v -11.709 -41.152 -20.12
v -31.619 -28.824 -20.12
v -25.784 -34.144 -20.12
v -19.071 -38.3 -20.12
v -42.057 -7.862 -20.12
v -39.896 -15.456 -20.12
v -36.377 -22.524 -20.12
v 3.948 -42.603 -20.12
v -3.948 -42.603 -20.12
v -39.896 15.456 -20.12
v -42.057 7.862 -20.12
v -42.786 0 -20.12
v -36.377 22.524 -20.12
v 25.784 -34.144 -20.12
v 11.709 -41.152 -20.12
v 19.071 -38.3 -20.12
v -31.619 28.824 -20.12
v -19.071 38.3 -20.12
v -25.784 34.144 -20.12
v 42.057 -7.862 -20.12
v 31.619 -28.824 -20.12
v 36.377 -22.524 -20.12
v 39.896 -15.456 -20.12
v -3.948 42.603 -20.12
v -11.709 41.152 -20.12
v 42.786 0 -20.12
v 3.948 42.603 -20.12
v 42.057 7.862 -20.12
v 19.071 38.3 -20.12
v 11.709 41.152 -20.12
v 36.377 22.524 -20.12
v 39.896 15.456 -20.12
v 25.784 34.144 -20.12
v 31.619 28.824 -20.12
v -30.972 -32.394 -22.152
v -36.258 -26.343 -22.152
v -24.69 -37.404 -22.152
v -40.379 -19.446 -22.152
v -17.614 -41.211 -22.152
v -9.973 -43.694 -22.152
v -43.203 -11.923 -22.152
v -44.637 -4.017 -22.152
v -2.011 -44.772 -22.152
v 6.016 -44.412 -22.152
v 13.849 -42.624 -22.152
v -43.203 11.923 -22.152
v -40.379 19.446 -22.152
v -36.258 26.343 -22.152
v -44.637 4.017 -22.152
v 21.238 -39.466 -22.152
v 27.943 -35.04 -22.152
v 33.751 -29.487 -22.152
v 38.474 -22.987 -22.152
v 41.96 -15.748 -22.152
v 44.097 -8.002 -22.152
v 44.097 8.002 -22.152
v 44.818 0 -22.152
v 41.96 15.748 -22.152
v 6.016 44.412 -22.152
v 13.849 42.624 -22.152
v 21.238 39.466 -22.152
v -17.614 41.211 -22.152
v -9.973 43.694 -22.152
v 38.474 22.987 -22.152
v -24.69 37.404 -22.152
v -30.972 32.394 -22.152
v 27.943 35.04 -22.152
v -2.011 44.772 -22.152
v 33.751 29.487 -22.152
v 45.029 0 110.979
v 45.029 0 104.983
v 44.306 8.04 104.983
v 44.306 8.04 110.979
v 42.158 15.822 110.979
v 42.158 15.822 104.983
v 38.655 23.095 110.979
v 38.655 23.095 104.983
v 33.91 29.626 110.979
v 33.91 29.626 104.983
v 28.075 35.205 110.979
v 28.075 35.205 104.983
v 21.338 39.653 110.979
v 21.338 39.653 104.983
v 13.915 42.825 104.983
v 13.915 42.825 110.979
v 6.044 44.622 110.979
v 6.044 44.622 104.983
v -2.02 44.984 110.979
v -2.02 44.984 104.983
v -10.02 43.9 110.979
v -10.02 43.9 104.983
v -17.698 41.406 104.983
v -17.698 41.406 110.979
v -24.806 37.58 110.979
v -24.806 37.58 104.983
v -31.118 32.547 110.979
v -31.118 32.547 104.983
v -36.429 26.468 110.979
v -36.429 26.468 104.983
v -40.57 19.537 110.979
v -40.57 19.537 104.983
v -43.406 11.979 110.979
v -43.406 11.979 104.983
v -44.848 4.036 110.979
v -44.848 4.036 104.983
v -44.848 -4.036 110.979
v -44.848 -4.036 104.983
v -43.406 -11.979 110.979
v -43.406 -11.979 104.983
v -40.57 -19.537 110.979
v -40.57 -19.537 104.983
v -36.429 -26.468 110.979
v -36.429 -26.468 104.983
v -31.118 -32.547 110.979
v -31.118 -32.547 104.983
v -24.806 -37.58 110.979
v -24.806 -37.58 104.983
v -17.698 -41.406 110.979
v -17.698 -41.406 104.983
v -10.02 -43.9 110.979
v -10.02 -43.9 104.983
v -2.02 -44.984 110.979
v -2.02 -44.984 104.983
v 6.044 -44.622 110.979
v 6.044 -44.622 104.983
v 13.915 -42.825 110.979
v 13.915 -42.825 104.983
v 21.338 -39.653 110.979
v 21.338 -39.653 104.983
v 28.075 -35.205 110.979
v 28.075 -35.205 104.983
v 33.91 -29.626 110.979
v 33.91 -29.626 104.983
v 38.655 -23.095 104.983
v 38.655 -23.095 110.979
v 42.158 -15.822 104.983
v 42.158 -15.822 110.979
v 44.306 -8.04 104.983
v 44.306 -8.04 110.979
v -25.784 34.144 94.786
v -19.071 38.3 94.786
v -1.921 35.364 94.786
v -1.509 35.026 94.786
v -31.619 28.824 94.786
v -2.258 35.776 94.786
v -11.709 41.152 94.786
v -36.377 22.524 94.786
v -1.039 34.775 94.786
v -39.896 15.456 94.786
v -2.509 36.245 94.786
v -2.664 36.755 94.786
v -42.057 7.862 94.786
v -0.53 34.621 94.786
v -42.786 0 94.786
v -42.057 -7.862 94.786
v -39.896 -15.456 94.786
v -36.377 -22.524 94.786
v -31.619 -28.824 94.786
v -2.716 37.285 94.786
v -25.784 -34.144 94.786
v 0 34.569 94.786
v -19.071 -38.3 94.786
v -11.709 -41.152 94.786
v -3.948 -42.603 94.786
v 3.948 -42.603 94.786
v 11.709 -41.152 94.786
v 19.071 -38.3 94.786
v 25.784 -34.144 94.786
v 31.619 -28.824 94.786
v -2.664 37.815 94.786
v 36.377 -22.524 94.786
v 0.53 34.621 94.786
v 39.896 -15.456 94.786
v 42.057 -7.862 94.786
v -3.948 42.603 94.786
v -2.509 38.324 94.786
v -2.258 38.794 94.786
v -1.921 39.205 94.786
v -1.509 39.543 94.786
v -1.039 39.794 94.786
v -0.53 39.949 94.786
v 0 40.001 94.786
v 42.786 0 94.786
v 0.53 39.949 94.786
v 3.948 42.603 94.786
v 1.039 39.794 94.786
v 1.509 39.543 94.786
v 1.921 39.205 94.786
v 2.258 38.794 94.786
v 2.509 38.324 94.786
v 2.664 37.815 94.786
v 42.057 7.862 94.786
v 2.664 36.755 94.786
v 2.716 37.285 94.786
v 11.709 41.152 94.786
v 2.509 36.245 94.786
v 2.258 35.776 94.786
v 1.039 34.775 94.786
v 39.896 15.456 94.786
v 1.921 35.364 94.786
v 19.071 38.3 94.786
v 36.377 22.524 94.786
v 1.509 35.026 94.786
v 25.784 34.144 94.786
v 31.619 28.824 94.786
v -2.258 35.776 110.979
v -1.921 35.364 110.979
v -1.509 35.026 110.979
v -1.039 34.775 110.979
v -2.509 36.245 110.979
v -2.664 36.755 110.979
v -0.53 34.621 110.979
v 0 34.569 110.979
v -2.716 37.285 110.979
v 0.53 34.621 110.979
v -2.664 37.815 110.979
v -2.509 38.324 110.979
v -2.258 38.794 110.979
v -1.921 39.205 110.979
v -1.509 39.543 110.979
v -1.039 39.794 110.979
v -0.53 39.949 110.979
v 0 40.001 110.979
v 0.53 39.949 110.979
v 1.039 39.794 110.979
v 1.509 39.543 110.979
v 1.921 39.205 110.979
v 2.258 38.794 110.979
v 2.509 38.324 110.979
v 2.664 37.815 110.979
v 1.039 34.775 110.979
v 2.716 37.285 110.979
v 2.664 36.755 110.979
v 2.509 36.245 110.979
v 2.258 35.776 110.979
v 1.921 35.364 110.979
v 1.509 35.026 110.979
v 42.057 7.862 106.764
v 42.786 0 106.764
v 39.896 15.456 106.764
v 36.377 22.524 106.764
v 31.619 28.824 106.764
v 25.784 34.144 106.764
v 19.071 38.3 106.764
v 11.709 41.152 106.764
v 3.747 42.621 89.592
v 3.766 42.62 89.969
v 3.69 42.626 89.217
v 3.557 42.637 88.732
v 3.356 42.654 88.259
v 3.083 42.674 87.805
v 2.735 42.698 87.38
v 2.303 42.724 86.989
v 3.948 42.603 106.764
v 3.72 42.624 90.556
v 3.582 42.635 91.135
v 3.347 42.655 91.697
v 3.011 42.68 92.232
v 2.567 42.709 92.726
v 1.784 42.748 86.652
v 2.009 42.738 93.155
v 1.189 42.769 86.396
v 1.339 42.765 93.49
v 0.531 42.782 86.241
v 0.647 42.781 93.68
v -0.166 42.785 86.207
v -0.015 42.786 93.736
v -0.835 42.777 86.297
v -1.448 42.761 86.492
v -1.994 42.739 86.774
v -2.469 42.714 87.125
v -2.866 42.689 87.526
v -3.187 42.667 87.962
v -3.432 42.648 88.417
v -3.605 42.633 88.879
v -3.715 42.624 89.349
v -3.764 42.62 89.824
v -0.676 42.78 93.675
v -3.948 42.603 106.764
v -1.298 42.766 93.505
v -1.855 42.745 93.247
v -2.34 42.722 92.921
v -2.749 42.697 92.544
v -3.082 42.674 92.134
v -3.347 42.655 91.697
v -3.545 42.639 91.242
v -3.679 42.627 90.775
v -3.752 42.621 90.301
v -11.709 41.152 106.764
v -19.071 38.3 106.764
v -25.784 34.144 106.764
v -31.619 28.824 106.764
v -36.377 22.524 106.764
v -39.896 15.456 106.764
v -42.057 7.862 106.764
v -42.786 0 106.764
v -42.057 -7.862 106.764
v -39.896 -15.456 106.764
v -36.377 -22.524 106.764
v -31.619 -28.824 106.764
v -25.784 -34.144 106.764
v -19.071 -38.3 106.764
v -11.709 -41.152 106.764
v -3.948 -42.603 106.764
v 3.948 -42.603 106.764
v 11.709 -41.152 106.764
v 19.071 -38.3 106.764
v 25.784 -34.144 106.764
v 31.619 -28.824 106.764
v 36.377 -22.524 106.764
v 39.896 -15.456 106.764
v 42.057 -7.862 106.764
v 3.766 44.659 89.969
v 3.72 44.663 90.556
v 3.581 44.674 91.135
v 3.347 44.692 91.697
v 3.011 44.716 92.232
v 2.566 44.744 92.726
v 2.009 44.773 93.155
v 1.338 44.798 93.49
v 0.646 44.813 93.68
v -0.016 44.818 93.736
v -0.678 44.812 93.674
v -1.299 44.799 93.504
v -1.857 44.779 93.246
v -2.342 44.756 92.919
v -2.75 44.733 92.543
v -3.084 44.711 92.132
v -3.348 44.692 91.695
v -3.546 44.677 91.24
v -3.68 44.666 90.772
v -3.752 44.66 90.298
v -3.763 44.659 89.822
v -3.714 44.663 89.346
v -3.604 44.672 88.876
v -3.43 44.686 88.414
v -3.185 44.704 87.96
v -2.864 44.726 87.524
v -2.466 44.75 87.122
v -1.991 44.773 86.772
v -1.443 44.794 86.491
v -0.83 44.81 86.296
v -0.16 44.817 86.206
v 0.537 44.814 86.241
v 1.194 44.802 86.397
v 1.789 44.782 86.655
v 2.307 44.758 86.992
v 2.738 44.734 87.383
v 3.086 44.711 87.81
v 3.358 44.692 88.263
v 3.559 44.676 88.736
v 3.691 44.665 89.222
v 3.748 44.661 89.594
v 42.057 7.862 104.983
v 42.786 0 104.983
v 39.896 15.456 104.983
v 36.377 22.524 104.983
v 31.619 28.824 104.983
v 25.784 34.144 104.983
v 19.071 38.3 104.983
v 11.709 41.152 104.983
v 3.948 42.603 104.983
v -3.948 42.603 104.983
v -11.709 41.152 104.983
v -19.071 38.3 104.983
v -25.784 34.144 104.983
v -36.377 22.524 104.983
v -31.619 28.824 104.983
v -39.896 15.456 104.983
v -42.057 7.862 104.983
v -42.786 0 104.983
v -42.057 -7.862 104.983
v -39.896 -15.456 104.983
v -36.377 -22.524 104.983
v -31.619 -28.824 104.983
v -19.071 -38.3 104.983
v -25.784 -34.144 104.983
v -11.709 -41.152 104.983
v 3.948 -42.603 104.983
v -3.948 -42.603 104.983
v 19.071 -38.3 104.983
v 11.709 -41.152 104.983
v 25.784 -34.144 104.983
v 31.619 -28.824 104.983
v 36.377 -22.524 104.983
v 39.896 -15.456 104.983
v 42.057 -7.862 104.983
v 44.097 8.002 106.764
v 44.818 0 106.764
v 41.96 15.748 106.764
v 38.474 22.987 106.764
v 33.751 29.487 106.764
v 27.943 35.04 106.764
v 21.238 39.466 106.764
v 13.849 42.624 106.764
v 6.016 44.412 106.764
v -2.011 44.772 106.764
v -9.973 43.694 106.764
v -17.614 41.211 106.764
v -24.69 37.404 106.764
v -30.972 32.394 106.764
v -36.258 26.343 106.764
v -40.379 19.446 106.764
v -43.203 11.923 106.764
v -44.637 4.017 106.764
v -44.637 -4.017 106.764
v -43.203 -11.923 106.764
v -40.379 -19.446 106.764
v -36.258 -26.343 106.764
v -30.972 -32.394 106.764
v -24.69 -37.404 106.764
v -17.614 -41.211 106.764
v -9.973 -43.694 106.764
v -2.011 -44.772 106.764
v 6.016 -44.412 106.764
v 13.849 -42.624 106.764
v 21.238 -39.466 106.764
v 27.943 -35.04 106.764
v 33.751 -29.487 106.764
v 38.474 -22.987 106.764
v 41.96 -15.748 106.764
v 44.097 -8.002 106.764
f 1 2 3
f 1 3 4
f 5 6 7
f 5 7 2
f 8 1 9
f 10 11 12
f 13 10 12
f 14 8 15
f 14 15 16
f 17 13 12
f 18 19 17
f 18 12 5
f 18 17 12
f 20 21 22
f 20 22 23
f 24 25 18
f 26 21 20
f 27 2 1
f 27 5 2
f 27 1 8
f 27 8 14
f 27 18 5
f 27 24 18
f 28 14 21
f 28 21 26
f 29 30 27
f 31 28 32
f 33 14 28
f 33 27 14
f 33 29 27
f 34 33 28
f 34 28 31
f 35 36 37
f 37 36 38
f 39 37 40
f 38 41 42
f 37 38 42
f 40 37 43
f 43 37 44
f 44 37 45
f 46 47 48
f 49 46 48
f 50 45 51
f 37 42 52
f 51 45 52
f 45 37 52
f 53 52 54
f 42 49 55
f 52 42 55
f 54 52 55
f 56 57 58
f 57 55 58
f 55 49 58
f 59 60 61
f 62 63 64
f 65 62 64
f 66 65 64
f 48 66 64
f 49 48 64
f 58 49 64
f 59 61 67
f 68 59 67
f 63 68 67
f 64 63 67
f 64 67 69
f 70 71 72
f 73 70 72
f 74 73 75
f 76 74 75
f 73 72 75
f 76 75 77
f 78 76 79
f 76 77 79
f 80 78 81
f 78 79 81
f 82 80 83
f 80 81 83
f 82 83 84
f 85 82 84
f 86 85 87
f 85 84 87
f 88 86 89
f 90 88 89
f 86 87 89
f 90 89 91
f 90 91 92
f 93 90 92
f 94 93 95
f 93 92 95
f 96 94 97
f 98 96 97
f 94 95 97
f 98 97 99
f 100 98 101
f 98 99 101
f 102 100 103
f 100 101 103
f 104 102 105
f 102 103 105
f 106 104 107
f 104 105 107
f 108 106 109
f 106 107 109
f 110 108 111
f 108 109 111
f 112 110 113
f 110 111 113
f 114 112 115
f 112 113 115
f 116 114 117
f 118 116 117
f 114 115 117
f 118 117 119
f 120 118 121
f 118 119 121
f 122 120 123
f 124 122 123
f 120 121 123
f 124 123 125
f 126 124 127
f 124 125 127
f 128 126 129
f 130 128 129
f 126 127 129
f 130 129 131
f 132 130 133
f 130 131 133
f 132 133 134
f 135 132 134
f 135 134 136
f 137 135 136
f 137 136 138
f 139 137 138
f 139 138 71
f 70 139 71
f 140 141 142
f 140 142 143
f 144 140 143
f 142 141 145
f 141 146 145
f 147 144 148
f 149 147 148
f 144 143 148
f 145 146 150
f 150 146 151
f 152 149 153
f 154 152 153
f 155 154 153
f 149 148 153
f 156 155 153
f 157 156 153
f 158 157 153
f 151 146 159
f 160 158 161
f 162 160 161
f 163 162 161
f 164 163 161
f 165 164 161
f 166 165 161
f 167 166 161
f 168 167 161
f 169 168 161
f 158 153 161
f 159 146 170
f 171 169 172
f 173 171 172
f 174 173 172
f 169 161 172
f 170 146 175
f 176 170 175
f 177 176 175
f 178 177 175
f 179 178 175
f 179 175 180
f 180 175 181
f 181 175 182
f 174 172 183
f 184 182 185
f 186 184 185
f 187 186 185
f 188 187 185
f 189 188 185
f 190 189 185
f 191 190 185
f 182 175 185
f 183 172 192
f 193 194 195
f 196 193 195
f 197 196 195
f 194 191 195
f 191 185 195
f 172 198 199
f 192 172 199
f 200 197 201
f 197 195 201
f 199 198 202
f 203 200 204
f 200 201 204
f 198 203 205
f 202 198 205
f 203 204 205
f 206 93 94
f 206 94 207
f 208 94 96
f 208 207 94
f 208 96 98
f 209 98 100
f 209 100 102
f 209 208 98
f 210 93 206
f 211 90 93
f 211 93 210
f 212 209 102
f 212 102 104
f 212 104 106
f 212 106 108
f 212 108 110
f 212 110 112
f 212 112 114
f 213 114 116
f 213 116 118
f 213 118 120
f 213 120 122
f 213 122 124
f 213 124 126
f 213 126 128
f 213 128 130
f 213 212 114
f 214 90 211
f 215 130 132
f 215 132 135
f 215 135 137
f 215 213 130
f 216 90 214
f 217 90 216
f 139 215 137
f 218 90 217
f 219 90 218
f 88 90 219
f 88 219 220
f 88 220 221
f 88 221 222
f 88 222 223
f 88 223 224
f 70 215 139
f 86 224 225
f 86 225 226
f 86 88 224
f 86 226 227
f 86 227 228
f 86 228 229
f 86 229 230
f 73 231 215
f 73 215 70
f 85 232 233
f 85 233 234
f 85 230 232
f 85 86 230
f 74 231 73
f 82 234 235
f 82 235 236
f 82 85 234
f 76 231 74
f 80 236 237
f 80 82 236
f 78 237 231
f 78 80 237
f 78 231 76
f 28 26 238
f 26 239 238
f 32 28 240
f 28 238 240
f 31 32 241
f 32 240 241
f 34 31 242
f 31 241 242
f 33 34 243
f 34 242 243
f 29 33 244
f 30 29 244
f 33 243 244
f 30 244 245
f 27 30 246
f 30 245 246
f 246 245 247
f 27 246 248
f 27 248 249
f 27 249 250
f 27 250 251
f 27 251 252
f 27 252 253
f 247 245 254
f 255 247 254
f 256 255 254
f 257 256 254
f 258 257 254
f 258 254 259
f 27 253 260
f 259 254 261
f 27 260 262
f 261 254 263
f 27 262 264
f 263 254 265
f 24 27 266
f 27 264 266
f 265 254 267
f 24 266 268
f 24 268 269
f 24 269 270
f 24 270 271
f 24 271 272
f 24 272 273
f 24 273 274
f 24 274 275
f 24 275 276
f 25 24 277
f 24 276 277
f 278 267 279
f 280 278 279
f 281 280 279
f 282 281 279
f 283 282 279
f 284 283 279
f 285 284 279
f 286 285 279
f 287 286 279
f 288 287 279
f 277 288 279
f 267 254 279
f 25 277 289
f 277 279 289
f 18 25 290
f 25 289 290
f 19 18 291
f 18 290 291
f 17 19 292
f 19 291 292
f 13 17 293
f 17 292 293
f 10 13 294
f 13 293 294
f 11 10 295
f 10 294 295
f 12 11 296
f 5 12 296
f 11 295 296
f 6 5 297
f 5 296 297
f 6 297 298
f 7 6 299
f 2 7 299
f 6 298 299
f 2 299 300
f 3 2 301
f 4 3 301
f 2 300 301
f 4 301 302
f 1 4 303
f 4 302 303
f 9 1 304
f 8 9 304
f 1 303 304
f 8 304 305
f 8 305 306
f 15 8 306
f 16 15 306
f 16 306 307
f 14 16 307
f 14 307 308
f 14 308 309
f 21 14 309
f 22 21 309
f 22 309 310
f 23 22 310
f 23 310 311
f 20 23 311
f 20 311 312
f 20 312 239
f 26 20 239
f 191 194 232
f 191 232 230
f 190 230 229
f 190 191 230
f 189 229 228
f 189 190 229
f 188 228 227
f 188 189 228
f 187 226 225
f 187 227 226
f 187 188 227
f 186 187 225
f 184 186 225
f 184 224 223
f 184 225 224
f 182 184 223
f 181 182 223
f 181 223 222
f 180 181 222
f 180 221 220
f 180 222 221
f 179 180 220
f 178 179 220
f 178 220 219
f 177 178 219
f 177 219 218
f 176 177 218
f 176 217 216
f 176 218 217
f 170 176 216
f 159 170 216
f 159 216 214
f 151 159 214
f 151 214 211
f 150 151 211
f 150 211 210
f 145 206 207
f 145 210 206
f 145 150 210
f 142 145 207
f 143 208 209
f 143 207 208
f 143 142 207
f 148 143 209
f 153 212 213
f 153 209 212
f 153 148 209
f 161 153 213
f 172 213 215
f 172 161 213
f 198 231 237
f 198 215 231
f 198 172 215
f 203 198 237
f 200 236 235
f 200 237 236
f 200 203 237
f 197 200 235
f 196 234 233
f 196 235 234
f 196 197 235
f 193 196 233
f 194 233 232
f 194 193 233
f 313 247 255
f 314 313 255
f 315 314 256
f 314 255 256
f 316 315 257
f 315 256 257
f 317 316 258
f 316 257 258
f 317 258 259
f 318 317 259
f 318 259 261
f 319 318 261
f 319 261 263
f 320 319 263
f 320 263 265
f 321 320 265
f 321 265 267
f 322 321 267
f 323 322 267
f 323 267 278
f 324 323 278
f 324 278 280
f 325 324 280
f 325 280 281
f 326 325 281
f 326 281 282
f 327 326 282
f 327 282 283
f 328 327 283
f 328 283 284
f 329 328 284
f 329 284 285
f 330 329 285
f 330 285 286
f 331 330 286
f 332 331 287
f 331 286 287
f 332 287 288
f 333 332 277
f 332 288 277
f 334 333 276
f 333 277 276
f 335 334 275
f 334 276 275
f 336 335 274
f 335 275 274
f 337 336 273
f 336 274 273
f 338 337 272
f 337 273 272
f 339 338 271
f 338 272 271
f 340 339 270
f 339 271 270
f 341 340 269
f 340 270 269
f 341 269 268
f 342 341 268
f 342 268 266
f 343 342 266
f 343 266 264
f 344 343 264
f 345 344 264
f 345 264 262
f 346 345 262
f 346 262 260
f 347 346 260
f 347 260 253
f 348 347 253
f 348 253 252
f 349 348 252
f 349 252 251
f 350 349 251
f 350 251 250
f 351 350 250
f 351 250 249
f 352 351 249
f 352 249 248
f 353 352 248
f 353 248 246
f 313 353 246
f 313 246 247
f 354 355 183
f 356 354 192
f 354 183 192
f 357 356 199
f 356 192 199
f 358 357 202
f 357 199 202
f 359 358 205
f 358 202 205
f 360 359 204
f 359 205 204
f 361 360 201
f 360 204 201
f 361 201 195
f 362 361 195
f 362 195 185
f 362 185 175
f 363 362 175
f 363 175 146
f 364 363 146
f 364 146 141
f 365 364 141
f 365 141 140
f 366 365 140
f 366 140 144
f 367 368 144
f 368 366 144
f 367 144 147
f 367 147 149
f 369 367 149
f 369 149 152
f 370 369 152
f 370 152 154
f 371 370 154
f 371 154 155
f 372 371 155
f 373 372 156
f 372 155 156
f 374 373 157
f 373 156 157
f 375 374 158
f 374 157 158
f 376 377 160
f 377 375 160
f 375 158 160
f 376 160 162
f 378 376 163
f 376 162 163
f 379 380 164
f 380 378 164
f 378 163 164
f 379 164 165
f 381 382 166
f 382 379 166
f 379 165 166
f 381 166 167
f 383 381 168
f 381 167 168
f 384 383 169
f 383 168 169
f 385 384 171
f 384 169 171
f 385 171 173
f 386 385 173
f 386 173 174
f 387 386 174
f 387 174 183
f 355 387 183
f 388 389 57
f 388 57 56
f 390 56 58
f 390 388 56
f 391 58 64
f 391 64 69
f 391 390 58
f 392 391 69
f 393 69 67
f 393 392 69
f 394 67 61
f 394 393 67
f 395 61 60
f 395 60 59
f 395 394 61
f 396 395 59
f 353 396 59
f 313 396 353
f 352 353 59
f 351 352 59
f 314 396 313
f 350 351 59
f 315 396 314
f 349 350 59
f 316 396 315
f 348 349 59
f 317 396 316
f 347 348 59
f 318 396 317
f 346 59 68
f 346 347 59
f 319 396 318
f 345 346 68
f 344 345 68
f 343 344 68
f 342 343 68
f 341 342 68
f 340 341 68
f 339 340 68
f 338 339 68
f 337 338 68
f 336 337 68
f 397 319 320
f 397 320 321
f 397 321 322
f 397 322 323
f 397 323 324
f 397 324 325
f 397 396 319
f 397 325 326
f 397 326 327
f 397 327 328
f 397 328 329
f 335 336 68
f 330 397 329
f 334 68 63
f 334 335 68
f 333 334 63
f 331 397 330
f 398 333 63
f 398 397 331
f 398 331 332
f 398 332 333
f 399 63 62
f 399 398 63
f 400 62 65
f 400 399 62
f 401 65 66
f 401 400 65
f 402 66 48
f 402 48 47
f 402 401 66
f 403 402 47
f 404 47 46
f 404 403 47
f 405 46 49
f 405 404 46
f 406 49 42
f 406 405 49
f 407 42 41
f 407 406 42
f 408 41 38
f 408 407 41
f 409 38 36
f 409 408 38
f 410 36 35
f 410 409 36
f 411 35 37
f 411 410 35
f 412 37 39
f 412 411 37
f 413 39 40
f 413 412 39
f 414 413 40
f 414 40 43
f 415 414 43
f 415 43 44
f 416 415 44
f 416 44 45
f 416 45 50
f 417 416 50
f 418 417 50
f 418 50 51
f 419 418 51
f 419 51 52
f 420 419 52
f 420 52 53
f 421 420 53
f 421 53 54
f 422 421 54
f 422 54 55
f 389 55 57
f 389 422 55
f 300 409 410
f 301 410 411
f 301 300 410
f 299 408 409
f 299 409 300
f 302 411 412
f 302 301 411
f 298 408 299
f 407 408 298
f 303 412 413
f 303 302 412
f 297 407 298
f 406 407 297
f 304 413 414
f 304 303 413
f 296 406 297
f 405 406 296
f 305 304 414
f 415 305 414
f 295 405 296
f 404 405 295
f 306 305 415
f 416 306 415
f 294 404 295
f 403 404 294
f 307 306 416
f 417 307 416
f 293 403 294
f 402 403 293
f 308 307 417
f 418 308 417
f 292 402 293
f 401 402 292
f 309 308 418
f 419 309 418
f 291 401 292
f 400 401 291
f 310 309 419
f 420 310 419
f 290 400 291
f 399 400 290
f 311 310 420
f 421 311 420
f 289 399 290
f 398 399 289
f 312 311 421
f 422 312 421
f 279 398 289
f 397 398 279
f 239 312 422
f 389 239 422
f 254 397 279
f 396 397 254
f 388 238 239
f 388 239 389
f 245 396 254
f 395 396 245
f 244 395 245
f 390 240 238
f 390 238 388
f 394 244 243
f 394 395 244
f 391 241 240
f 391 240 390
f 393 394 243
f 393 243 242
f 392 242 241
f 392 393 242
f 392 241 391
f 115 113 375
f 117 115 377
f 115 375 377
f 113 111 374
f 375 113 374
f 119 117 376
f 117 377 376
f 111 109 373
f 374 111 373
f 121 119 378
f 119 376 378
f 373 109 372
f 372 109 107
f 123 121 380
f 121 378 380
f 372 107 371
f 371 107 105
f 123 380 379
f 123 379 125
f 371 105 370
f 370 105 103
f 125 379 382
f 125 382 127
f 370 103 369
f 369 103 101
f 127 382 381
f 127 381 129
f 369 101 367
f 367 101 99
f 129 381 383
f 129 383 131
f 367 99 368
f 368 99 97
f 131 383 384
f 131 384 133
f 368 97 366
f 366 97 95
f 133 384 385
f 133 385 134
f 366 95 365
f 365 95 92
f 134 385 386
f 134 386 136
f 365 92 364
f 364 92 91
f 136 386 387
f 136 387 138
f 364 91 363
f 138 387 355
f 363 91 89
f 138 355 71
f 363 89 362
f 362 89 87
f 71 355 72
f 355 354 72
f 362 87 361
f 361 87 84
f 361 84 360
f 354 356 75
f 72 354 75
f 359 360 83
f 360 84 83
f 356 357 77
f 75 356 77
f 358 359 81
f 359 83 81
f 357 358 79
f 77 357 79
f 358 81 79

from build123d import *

# Parameters (mm, degrees)
F0_R           = 44.8176210425
F1_DEPTH       = 106.7643370479
F1_DEPTH_BACK  = 22.1521705389
F2_T           = -2.032
F3_R           = 3.7663248985
F4_DEPTH       = 59.9014814943
F5_START       = 91.4322212338
F2_FACE_R      = 42.7856210425
F5_DEPTH       = 13.5680139065
F6_T           = -1.524
F8_START       = 104.9826219678
F7_R           = 45.0292101327
F8_DEPTH       = 5.9961620718
F9_START       = 9.906
F5_FACE_R      = 42.7856210425
F9_DEPTH       = 15.494
F11_R          = 2.7160500701
F12_DEPTH      = 244.3860024214
F12_DEPTH_BACK = 45.8991546184


with BuildPart() as f1:
    # F0 (on Top) → F1 (new body, two sides)
    with BuildSketch(Plane.XY) as f1_sk:
        Circle(F0_R)
    extrude(amount=F1_DEPTH)
    extrude(f1_sk.sketch, amount=-F1_DEPTH_BACK)

    # F2
    f2_openings = [f1.faces().sort_by_distance(p)[0] for p in [
        (0, 0, 106.764337),
    ]]
    offset(amount=F2_T, openings=f2_openings)

    # F3 (on Front) → F4 (cut)
    with BuildSketch(Plane.XZ):
        with Locations((0, 89.9693667889)):
            Circle(F3_R)
    extrude(amount=-F4_DEPTH, mode=Mode.SUBTRACT)


with BuildPart() as f5:
    # F2_face (on face) → F5 (new body)
    with BuildSketch(Plane.XY.offset(-20.1201705389).offset(F5_START)):
        Circle(F2_FACE_R)
    extrude(amount=F5_DEPTH)

    # F6
    f6_openings = [f5.faces().sort_by_distance(p)[0] for p in [
        (0, 0, 71.312051),
    ]]
    offset(amount=F6_T, openings=f6_openings)


with BuildPart() as f8:
    # F7 (on Top) → F8 (new body)
    with BuildSketch(Plane.XY.offset(F8_START)):
        Circle(F7_R)
    extrude(amount=F8_DEPTH)

    # F5_face (on face) → F9 (join)
    with BuildSketch(Plane.XY.offset(84.8800646014).offset(F9_START)):
        Circle(F5_FACE_R)
    extrude(amount=F9_DEPTH)

    # F11 (on Top) → F12 (cut, two sides)
    with BuildSketch(Plane.XY) as f12_sk:
        with Locations((0, 37.2846573591)):
            Circle(F11_R)
    extrude(amount=F12_DEPTH, mode=Mode.SUBTRACT)
    extrude(f12_sk.sketch, amount=-F12_DEPTH_BACK, mode=Mode.SUBTRACT)


solid = Compound([f1.part, f8.part])
